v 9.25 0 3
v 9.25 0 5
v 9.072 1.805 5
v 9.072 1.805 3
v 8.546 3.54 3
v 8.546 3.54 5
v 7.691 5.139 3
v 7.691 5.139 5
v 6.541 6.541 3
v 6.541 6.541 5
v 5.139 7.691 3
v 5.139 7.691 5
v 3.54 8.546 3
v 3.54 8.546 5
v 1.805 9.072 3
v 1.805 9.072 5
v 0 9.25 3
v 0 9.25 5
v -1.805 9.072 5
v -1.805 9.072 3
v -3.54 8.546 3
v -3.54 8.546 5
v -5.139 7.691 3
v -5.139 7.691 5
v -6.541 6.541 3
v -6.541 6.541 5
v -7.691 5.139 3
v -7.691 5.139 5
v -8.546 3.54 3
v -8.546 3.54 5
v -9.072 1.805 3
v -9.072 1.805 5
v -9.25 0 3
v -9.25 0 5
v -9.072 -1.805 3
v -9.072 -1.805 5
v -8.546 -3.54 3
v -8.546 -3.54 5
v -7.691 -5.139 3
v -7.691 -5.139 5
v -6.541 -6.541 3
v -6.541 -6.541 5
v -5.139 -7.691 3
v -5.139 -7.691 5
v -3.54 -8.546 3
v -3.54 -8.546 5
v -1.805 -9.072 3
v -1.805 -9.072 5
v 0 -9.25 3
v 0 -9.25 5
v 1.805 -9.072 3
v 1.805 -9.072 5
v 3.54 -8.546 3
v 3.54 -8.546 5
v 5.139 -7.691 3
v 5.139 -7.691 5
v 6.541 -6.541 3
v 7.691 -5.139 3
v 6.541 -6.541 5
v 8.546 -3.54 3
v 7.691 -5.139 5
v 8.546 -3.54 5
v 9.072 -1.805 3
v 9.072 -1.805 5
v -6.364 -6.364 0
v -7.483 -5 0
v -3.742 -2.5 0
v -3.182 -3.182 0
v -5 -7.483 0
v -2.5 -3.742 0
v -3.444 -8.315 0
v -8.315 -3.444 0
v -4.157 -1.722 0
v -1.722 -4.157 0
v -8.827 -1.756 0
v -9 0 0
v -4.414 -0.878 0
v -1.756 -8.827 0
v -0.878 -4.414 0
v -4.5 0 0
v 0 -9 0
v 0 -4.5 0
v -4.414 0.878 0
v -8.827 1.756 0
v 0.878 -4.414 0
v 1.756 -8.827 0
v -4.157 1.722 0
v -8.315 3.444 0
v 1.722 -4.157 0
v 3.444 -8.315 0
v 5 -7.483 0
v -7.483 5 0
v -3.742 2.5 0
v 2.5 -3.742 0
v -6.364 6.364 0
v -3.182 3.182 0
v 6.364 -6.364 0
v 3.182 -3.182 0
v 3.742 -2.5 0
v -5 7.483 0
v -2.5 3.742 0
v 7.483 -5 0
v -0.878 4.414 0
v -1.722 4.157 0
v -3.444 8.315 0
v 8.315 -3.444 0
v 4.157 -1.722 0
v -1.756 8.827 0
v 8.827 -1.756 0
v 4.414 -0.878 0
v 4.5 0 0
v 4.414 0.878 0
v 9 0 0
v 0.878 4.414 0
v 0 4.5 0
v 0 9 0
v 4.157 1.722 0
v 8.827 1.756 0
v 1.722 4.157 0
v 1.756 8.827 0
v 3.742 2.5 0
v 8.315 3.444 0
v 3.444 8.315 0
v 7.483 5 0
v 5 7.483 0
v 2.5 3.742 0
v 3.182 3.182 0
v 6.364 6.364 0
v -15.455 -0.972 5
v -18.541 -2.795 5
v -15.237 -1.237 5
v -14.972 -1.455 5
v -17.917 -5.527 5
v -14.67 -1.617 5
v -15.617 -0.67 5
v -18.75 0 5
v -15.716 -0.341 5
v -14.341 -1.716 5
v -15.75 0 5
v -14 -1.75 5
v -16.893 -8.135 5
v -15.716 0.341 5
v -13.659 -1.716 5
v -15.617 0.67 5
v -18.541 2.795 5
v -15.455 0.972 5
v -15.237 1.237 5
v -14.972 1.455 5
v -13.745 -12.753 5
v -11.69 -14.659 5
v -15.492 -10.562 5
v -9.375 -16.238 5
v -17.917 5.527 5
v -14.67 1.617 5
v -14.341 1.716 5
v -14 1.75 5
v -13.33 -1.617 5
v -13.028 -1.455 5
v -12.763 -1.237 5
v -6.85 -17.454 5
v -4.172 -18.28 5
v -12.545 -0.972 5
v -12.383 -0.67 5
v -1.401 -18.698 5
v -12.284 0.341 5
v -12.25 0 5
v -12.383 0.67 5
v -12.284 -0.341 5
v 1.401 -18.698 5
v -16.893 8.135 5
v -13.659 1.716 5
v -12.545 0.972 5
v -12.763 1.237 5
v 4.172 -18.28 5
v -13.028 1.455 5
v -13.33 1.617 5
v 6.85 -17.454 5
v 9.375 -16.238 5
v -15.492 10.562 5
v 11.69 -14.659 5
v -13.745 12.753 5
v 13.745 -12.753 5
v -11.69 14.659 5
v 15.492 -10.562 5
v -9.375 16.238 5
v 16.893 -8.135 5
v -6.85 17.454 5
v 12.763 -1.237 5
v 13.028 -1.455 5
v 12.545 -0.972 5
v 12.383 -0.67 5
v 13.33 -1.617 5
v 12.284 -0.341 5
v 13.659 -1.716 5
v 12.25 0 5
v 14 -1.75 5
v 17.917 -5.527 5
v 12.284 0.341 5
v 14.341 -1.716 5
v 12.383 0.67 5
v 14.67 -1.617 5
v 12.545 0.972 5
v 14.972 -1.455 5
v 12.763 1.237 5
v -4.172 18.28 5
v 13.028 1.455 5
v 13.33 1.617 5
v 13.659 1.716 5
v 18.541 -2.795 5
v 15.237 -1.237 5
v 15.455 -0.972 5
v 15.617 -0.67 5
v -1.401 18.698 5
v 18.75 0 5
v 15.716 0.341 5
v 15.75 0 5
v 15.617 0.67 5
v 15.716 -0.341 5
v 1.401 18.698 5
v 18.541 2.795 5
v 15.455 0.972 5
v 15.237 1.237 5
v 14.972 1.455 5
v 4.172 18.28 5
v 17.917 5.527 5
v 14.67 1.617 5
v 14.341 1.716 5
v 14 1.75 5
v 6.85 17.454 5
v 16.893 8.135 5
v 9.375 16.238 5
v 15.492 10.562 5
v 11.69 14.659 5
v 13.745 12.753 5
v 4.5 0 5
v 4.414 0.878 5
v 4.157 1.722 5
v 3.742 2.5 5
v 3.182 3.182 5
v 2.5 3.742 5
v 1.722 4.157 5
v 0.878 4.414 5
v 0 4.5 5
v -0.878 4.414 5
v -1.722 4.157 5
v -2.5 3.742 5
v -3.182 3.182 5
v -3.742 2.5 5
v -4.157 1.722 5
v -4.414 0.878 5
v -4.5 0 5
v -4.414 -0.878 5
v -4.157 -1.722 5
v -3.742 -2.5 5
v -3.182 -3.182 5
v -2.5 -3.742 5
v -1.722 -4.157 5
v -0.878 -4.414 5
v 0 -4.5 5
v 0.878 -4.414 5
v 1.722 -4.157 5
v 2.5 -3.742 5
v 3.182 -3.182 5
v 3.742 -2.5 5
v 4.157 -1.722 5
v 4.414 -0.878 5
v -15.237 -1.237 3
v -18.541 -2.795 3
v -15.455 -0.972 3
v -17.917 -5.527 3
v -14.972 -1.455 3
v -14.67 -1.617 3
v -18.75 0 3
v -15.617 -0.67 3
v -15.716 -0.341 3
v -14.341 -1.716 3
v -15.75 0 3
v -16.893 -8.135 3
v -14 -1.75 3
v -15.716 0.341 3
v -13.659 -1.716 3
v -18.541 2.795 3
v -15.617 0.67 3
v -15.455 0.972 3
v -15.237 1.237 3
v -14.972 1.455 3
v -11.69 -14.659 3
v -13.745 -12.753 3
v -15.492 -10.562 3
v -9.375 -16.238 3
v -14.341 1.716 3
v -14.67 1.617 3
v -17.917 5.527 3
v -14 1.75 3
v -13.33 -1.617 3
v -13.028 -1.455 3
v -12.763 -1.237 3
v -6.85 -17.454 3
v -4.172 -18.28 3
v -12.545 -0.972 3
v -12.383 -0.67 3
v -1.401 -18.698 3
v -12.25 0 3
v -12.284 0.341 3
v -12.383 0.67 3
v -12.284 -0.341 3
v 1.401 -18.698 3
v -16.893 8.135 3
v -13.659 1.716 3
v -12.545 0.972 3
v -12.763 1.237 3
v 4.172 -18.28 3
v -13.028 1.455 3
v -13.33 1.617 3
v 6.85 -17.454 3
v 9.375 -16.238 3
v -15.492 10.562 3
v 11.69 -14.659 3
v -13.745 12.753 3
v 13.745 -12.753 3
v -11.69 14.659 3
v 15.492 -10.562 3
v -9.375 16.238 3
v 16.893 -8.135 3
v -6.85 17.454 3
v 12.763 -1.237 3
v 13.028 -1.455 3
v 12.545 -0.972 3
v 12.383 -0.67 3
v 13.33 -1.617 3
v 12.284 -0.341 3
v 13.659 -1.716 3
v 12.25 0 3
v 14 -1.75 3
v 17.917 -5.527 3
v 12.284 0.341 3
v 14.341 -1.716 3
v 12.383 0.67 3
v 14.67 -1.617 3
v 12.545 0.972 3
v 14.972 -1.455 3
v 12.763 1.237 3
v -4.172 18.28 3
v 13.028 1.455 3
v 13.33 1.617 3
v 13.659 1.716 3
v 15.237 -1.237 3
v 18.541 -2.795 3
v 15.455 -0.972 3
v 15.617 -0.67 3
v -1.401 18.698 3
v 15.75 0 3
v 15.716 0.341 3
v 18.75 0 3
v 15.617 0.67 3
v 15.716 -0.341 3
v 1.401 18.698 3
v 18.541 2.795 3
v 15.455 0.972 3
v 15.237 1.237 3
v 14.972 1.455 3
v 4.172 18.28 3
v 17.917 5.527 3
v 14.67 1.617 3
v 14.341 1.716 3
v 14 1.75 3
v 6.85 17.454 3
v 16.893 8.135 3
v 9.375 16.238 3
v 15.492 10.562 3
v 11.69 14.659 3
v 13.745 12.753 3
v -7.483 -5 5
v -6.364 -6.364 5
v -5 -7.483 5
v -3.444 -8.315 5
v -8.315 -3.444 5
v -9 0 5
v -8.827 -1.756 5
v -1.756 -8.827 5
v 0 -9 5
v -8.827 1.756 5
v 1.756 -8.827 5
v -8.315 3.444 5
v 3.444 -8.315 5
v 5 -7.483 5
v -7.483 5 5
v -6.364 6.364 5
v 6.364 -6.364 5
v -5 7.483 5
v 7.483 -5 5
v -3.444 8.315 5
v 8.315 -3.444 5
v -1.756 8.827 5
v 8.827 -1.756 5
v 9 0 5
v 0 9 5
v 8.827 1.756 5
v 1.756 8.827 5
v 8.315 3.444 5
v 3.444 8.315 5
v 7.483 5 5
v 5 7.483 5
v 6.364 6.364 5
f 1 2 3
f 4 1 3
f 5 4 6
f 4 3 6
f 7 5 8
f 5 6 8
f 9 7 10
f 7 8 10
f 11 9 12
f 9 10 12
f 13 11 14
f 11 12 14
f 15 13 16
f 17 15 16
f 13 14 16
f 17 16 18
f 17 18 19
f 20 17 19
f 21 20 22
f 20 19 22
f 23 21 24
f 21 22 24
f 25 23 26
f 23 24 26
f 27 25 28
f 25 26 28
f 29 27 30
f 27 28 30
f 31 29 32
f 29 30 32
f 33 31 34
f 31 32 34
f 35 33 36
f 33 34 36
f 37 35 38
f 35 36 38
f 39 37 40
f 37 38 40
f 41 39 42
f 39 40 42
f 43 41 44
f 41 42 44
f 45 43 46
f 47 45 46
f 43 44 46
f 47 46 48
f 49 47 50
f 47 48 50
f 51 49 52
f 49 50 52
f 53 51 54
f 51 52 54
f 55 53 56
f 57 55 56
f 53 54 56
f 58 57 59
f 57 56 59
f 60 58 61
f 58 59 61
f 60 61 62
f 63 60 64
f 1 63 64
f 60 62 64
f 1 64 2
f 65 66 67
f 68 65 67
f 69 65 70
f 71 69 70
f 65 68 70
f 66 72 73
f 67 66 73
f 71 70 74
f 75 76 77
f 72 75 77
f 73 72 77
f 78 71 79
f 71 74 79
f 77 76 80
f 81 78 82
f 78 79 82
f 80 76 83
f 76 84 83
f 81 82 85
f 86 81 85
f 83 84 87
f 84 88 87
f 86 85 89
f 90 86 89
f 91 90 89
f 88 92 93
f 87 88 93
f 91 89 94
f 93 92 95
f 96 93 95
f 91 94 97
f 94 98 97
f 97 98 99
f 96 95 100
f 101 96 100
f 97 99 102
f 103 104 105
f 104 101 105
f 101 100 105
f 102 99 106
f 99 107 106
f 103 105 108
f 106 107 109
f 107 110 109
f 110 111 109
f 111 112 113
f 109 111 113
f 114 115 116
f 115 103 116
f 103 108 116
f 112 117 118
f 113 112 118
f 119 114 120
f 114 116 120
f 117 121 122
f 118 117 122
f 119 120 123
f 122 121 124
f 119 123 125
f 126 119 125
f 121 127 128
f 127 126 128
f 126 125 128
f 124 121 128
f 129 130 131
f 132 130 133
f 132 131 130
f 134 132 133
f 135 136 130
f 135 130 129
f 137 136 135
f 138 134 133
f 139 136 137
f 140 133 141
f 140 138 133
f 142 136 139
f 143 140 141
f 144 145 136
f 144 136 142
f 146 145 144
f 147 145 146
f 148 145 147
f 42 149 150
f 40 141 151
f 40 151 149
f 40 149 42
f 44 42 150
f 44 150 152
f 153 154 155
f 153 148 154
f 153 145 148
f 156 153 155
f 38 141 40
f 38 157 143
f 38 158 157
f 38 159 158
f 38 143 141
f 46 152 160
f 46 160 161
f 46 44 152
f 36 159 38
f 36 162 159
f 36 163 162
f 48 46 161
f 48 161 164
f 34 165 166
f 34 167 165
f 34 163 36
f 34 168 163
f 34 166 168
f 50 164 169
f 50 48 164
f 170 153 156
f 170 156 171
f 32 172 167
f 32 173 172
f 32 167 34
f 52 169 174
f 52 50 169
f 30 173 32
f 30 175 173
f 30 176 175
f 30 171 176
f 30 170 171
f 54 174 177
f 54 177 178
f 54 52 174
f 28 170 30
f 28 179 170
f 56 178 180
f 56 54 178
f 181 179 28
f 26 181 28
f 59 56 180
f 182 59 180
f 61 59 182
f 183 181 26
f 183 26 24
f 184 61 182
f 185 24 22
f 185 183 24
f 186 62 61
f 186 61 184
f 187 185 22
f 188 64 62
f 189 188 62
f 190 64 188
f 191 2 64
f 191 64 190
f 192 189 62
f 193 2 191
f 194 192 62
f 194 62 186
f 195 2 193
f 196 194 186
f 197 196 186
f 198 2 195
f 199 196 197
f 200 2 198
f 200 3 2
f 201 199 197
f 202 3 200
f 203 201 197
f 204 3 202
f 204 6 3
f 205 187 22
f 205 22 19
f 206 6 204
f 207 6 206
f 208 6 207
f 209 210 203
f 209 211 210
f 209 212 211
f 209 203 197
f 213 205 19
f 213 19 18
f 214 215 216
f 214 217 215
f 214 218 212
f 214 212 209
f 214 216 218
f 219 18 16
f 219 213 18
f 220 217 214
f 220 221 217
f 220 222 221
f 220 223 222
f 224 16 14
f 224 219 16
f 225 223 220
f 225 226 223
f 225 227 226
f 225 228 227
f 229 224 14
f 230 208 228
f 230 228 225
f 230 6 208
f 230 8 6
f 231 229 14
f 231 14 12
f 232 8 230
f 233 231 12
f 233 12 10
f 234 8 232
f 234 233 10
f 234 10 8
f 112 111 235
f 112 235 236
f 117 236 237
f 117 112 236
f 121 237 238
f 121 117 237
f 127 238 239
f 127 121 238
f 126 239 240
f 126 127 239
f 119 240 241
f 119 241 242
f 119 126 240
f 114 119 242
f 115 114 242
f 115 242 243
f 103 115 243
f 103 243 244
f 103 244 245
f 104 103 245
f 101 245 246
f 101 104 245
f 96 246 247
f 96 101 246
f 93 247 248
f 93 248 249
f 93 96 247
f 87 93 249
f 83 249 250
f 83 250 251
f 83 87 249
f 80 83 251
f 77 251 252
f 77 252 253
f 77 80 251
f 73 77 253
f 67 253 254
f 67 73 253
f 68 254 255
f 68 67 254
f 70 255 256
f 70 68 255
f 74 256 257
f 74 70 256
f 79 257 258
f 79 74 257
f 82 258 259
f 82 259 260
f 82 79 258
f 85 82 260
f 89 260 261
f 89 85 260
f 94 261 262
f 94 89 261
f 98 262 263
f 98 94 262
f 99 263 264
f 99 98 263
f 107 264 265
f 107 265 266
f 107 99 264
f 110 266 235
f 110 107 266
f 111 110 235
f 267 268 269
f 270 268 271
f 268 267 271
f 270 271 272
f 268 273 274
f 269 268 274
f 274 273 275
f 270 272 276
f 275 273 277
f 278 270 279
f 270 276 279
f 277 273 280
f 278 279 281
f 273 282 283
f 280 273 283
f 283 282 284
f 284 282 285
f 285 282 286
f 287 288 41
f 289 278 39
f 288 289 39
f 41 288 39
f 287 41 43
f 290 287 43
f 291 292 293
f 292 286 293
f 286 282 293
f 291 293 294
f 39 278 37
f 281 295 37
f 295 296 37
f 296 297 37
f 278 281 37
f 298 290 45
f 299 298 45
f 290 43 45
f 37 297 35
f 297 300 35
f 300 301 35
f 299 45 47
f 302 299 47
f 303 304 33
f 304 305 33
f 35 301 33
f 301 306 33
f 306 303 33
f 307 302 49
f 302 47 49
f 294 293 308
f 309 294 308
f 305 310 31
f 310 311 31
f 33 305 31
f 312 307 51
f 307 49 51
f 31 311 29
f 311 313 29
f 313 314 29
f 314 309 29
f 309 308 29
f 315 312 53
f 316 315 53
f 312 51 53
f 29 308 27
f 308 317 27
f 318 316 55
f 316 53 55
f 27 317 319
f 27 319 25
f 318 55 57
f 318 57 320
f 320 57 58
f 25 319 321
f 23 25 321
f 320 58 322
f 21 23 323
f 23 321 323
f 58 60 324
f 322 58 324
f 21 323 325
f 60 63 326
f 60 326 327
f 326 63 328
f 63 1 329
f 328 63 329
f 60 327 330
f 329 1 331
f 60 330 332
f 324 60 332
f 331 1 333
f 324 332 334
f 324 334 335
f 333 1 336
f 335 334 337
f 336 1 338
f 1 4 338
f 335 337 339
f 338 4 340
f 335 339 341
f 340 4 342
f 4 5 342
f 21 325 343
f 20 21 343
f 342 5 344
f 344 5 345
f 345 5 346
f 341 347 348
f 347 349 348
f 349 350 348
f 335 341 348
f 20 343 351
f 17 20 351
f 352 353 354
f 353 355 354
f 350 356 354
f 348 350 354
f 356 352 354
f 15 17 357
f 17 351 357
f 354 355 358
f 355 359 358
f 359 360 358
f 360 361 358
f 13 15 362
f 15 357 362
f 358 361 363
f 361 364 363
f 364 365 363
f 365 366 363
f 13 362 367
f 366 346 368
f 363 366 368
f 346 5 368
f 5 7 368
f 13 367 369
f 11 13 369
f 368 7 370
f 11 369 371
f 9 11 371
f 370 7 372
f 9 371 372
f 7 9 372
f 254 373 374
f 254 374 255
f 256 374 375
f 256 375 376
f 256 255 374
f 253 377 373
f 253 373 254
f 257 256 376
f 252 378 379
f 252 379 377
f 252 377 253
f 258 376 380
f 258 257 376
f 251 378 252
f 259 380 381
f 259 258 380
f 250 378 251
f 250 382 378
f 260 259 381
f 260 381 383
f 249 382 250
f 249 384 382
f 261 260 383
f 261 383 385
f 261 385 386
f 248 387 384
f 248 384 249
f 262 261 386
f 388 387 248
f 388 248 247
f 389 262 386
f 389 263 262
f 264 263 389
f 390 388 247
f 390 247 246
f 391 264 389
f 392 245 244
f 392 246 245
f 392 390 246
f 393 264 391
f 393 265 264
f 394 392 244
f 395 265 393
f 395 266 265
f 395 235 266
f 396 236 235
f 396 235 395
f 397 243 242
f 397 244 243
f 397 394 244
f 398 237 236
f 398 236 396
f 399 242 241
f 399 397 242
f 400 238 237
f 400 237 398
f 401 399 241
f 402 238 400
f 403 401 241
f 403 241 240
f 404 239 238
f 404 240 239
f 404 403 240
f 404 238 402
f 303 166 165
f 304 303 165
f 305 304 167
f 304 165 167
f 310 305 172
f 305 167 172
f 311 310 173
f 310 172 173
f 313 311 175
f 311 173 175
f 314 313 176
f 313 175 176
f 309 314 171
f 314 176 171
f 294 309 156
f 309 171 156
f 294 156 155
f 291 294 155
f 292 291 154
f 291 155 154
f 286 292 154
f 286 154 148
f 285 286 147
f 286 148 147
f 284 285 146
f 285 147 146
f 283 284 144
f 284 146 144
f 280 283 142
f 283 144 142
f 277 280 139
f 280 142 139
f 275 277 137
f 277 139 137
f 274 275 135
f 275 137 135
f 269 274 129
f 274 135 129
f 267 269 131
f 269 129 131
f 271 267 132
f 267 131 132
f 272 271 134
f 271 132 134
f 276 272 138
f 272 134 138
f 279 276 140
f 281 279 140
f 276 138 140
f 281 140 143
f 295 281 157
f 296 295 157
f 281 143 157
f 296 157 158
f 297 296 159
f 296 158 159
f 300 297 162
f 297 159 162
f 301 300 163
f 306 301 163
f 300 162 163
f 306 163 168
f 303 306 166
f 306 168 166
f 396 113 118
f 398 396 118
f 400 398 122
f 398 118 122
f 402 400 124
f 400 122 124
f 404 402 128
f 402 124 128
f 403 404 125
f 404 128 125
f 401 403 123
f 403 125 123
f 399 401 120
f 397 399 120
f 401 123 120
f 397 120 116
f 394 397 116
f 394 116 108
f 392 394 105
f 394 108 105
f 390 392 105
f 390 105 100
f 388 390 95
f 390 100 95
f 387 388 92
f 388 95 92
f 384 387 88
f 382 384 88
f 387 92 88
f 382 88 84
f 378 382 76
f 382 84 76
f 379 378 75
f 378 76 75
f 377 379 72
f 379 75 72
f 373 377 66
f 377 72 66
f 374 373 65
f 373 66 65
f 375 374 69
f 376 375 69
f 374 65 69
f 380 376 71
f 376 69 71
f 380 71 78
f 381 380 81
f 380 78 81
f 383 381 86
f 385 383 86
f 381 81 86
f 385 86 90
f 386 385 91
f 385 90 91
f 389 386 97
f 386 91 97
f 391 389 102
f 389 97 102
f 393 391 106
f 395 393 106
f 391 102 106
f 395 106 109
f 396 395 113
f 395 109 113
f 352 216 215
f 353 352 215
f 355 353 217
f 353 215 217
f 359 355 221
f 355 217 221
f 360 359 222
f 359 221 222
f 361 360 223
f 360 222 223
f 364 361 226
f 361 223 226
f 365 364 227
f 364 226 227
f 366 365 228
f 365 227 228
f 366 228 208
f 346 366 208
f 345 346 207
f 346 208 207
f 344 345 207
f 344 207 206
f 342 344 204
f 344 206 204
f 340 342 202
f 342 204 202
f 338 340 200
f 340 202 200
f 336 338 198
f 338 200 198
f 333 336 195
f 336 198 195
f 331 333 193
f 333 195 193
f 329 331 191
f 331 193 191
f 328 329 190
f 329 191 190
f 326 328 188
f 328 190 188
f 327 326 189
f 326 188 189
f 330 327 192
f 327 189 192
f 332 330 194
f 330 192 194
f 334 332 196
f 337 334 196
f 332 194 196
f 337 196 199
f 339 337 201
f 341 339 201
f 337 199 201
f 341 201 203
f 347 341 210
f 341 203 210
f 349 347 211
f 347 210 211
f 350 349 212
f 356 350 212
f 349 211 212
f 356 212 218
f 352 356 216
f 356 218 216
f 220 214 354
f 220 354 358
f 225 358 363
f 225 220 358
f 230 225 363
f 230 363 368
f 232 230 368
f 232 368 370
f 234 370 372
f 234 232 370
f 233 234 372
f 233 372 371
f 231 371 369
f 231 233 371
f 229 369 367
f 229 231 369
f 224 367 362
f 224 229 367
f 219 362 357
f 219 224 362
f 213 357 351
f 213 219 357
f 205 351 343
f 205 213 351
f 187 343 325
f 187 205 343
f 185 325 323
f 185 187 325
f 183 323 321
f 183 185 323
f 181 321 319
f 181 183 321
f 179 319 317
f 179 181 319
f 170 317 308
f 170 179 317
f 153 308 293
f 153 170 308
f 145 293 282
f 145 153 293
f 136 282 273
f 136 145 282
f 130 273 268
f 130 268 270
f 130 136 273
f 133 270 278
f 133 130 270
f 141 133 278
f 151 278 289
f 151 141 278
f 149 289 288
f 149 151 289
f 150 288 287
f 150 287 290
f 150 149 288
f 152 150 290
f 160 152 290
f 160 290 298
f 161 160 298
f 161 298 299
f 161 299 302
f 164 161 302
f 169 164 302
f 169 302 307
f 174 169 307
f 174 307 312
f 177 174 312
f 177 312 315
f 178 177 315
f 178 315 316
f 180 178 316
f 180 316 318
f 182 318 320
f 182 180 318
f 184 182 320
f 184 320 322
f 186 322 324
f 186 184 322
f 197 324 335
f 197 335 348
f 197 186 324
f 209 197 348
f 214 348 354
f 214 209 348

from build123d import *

# Parameters (mm, degrees)
F0_R     = 9
F0_R_2   = 4.5
F1_DEPTH = 5
F2_R     = 18.75
F2_R_2   = 1.75
F2_R_3   = 9.25
F3_DEPTH = 2


with BuildPart() as f1:
    # F0 (on Top) → F1 (new body)
    with BuildSketch(Plane.XY):
        Circle(F0_R)
        Circle(F0_R_2, mode=Mode.SUBTRACT)
    extrude(amount=F1_DEPTH)


with BuildPart() as f3:
    # F2 (on face) → F3 (new body)
    with BuildSketch(Plane.XY.offset(5)):
        Circle(F2_R)
        with Locations((-14, 0)):
            Circle(F2_R_2, mode=Mode.SUBTRACT)
        Circle(F2_R_3, mode=Mode.SUBTRACT)
        with Locations((14, 0)):
            Circle(F2_R_2, mode=Mode.SUBTRACT)
    extrude(amount=-F3_DEPTH)


solid = Compound([f1.part, f3.part])
